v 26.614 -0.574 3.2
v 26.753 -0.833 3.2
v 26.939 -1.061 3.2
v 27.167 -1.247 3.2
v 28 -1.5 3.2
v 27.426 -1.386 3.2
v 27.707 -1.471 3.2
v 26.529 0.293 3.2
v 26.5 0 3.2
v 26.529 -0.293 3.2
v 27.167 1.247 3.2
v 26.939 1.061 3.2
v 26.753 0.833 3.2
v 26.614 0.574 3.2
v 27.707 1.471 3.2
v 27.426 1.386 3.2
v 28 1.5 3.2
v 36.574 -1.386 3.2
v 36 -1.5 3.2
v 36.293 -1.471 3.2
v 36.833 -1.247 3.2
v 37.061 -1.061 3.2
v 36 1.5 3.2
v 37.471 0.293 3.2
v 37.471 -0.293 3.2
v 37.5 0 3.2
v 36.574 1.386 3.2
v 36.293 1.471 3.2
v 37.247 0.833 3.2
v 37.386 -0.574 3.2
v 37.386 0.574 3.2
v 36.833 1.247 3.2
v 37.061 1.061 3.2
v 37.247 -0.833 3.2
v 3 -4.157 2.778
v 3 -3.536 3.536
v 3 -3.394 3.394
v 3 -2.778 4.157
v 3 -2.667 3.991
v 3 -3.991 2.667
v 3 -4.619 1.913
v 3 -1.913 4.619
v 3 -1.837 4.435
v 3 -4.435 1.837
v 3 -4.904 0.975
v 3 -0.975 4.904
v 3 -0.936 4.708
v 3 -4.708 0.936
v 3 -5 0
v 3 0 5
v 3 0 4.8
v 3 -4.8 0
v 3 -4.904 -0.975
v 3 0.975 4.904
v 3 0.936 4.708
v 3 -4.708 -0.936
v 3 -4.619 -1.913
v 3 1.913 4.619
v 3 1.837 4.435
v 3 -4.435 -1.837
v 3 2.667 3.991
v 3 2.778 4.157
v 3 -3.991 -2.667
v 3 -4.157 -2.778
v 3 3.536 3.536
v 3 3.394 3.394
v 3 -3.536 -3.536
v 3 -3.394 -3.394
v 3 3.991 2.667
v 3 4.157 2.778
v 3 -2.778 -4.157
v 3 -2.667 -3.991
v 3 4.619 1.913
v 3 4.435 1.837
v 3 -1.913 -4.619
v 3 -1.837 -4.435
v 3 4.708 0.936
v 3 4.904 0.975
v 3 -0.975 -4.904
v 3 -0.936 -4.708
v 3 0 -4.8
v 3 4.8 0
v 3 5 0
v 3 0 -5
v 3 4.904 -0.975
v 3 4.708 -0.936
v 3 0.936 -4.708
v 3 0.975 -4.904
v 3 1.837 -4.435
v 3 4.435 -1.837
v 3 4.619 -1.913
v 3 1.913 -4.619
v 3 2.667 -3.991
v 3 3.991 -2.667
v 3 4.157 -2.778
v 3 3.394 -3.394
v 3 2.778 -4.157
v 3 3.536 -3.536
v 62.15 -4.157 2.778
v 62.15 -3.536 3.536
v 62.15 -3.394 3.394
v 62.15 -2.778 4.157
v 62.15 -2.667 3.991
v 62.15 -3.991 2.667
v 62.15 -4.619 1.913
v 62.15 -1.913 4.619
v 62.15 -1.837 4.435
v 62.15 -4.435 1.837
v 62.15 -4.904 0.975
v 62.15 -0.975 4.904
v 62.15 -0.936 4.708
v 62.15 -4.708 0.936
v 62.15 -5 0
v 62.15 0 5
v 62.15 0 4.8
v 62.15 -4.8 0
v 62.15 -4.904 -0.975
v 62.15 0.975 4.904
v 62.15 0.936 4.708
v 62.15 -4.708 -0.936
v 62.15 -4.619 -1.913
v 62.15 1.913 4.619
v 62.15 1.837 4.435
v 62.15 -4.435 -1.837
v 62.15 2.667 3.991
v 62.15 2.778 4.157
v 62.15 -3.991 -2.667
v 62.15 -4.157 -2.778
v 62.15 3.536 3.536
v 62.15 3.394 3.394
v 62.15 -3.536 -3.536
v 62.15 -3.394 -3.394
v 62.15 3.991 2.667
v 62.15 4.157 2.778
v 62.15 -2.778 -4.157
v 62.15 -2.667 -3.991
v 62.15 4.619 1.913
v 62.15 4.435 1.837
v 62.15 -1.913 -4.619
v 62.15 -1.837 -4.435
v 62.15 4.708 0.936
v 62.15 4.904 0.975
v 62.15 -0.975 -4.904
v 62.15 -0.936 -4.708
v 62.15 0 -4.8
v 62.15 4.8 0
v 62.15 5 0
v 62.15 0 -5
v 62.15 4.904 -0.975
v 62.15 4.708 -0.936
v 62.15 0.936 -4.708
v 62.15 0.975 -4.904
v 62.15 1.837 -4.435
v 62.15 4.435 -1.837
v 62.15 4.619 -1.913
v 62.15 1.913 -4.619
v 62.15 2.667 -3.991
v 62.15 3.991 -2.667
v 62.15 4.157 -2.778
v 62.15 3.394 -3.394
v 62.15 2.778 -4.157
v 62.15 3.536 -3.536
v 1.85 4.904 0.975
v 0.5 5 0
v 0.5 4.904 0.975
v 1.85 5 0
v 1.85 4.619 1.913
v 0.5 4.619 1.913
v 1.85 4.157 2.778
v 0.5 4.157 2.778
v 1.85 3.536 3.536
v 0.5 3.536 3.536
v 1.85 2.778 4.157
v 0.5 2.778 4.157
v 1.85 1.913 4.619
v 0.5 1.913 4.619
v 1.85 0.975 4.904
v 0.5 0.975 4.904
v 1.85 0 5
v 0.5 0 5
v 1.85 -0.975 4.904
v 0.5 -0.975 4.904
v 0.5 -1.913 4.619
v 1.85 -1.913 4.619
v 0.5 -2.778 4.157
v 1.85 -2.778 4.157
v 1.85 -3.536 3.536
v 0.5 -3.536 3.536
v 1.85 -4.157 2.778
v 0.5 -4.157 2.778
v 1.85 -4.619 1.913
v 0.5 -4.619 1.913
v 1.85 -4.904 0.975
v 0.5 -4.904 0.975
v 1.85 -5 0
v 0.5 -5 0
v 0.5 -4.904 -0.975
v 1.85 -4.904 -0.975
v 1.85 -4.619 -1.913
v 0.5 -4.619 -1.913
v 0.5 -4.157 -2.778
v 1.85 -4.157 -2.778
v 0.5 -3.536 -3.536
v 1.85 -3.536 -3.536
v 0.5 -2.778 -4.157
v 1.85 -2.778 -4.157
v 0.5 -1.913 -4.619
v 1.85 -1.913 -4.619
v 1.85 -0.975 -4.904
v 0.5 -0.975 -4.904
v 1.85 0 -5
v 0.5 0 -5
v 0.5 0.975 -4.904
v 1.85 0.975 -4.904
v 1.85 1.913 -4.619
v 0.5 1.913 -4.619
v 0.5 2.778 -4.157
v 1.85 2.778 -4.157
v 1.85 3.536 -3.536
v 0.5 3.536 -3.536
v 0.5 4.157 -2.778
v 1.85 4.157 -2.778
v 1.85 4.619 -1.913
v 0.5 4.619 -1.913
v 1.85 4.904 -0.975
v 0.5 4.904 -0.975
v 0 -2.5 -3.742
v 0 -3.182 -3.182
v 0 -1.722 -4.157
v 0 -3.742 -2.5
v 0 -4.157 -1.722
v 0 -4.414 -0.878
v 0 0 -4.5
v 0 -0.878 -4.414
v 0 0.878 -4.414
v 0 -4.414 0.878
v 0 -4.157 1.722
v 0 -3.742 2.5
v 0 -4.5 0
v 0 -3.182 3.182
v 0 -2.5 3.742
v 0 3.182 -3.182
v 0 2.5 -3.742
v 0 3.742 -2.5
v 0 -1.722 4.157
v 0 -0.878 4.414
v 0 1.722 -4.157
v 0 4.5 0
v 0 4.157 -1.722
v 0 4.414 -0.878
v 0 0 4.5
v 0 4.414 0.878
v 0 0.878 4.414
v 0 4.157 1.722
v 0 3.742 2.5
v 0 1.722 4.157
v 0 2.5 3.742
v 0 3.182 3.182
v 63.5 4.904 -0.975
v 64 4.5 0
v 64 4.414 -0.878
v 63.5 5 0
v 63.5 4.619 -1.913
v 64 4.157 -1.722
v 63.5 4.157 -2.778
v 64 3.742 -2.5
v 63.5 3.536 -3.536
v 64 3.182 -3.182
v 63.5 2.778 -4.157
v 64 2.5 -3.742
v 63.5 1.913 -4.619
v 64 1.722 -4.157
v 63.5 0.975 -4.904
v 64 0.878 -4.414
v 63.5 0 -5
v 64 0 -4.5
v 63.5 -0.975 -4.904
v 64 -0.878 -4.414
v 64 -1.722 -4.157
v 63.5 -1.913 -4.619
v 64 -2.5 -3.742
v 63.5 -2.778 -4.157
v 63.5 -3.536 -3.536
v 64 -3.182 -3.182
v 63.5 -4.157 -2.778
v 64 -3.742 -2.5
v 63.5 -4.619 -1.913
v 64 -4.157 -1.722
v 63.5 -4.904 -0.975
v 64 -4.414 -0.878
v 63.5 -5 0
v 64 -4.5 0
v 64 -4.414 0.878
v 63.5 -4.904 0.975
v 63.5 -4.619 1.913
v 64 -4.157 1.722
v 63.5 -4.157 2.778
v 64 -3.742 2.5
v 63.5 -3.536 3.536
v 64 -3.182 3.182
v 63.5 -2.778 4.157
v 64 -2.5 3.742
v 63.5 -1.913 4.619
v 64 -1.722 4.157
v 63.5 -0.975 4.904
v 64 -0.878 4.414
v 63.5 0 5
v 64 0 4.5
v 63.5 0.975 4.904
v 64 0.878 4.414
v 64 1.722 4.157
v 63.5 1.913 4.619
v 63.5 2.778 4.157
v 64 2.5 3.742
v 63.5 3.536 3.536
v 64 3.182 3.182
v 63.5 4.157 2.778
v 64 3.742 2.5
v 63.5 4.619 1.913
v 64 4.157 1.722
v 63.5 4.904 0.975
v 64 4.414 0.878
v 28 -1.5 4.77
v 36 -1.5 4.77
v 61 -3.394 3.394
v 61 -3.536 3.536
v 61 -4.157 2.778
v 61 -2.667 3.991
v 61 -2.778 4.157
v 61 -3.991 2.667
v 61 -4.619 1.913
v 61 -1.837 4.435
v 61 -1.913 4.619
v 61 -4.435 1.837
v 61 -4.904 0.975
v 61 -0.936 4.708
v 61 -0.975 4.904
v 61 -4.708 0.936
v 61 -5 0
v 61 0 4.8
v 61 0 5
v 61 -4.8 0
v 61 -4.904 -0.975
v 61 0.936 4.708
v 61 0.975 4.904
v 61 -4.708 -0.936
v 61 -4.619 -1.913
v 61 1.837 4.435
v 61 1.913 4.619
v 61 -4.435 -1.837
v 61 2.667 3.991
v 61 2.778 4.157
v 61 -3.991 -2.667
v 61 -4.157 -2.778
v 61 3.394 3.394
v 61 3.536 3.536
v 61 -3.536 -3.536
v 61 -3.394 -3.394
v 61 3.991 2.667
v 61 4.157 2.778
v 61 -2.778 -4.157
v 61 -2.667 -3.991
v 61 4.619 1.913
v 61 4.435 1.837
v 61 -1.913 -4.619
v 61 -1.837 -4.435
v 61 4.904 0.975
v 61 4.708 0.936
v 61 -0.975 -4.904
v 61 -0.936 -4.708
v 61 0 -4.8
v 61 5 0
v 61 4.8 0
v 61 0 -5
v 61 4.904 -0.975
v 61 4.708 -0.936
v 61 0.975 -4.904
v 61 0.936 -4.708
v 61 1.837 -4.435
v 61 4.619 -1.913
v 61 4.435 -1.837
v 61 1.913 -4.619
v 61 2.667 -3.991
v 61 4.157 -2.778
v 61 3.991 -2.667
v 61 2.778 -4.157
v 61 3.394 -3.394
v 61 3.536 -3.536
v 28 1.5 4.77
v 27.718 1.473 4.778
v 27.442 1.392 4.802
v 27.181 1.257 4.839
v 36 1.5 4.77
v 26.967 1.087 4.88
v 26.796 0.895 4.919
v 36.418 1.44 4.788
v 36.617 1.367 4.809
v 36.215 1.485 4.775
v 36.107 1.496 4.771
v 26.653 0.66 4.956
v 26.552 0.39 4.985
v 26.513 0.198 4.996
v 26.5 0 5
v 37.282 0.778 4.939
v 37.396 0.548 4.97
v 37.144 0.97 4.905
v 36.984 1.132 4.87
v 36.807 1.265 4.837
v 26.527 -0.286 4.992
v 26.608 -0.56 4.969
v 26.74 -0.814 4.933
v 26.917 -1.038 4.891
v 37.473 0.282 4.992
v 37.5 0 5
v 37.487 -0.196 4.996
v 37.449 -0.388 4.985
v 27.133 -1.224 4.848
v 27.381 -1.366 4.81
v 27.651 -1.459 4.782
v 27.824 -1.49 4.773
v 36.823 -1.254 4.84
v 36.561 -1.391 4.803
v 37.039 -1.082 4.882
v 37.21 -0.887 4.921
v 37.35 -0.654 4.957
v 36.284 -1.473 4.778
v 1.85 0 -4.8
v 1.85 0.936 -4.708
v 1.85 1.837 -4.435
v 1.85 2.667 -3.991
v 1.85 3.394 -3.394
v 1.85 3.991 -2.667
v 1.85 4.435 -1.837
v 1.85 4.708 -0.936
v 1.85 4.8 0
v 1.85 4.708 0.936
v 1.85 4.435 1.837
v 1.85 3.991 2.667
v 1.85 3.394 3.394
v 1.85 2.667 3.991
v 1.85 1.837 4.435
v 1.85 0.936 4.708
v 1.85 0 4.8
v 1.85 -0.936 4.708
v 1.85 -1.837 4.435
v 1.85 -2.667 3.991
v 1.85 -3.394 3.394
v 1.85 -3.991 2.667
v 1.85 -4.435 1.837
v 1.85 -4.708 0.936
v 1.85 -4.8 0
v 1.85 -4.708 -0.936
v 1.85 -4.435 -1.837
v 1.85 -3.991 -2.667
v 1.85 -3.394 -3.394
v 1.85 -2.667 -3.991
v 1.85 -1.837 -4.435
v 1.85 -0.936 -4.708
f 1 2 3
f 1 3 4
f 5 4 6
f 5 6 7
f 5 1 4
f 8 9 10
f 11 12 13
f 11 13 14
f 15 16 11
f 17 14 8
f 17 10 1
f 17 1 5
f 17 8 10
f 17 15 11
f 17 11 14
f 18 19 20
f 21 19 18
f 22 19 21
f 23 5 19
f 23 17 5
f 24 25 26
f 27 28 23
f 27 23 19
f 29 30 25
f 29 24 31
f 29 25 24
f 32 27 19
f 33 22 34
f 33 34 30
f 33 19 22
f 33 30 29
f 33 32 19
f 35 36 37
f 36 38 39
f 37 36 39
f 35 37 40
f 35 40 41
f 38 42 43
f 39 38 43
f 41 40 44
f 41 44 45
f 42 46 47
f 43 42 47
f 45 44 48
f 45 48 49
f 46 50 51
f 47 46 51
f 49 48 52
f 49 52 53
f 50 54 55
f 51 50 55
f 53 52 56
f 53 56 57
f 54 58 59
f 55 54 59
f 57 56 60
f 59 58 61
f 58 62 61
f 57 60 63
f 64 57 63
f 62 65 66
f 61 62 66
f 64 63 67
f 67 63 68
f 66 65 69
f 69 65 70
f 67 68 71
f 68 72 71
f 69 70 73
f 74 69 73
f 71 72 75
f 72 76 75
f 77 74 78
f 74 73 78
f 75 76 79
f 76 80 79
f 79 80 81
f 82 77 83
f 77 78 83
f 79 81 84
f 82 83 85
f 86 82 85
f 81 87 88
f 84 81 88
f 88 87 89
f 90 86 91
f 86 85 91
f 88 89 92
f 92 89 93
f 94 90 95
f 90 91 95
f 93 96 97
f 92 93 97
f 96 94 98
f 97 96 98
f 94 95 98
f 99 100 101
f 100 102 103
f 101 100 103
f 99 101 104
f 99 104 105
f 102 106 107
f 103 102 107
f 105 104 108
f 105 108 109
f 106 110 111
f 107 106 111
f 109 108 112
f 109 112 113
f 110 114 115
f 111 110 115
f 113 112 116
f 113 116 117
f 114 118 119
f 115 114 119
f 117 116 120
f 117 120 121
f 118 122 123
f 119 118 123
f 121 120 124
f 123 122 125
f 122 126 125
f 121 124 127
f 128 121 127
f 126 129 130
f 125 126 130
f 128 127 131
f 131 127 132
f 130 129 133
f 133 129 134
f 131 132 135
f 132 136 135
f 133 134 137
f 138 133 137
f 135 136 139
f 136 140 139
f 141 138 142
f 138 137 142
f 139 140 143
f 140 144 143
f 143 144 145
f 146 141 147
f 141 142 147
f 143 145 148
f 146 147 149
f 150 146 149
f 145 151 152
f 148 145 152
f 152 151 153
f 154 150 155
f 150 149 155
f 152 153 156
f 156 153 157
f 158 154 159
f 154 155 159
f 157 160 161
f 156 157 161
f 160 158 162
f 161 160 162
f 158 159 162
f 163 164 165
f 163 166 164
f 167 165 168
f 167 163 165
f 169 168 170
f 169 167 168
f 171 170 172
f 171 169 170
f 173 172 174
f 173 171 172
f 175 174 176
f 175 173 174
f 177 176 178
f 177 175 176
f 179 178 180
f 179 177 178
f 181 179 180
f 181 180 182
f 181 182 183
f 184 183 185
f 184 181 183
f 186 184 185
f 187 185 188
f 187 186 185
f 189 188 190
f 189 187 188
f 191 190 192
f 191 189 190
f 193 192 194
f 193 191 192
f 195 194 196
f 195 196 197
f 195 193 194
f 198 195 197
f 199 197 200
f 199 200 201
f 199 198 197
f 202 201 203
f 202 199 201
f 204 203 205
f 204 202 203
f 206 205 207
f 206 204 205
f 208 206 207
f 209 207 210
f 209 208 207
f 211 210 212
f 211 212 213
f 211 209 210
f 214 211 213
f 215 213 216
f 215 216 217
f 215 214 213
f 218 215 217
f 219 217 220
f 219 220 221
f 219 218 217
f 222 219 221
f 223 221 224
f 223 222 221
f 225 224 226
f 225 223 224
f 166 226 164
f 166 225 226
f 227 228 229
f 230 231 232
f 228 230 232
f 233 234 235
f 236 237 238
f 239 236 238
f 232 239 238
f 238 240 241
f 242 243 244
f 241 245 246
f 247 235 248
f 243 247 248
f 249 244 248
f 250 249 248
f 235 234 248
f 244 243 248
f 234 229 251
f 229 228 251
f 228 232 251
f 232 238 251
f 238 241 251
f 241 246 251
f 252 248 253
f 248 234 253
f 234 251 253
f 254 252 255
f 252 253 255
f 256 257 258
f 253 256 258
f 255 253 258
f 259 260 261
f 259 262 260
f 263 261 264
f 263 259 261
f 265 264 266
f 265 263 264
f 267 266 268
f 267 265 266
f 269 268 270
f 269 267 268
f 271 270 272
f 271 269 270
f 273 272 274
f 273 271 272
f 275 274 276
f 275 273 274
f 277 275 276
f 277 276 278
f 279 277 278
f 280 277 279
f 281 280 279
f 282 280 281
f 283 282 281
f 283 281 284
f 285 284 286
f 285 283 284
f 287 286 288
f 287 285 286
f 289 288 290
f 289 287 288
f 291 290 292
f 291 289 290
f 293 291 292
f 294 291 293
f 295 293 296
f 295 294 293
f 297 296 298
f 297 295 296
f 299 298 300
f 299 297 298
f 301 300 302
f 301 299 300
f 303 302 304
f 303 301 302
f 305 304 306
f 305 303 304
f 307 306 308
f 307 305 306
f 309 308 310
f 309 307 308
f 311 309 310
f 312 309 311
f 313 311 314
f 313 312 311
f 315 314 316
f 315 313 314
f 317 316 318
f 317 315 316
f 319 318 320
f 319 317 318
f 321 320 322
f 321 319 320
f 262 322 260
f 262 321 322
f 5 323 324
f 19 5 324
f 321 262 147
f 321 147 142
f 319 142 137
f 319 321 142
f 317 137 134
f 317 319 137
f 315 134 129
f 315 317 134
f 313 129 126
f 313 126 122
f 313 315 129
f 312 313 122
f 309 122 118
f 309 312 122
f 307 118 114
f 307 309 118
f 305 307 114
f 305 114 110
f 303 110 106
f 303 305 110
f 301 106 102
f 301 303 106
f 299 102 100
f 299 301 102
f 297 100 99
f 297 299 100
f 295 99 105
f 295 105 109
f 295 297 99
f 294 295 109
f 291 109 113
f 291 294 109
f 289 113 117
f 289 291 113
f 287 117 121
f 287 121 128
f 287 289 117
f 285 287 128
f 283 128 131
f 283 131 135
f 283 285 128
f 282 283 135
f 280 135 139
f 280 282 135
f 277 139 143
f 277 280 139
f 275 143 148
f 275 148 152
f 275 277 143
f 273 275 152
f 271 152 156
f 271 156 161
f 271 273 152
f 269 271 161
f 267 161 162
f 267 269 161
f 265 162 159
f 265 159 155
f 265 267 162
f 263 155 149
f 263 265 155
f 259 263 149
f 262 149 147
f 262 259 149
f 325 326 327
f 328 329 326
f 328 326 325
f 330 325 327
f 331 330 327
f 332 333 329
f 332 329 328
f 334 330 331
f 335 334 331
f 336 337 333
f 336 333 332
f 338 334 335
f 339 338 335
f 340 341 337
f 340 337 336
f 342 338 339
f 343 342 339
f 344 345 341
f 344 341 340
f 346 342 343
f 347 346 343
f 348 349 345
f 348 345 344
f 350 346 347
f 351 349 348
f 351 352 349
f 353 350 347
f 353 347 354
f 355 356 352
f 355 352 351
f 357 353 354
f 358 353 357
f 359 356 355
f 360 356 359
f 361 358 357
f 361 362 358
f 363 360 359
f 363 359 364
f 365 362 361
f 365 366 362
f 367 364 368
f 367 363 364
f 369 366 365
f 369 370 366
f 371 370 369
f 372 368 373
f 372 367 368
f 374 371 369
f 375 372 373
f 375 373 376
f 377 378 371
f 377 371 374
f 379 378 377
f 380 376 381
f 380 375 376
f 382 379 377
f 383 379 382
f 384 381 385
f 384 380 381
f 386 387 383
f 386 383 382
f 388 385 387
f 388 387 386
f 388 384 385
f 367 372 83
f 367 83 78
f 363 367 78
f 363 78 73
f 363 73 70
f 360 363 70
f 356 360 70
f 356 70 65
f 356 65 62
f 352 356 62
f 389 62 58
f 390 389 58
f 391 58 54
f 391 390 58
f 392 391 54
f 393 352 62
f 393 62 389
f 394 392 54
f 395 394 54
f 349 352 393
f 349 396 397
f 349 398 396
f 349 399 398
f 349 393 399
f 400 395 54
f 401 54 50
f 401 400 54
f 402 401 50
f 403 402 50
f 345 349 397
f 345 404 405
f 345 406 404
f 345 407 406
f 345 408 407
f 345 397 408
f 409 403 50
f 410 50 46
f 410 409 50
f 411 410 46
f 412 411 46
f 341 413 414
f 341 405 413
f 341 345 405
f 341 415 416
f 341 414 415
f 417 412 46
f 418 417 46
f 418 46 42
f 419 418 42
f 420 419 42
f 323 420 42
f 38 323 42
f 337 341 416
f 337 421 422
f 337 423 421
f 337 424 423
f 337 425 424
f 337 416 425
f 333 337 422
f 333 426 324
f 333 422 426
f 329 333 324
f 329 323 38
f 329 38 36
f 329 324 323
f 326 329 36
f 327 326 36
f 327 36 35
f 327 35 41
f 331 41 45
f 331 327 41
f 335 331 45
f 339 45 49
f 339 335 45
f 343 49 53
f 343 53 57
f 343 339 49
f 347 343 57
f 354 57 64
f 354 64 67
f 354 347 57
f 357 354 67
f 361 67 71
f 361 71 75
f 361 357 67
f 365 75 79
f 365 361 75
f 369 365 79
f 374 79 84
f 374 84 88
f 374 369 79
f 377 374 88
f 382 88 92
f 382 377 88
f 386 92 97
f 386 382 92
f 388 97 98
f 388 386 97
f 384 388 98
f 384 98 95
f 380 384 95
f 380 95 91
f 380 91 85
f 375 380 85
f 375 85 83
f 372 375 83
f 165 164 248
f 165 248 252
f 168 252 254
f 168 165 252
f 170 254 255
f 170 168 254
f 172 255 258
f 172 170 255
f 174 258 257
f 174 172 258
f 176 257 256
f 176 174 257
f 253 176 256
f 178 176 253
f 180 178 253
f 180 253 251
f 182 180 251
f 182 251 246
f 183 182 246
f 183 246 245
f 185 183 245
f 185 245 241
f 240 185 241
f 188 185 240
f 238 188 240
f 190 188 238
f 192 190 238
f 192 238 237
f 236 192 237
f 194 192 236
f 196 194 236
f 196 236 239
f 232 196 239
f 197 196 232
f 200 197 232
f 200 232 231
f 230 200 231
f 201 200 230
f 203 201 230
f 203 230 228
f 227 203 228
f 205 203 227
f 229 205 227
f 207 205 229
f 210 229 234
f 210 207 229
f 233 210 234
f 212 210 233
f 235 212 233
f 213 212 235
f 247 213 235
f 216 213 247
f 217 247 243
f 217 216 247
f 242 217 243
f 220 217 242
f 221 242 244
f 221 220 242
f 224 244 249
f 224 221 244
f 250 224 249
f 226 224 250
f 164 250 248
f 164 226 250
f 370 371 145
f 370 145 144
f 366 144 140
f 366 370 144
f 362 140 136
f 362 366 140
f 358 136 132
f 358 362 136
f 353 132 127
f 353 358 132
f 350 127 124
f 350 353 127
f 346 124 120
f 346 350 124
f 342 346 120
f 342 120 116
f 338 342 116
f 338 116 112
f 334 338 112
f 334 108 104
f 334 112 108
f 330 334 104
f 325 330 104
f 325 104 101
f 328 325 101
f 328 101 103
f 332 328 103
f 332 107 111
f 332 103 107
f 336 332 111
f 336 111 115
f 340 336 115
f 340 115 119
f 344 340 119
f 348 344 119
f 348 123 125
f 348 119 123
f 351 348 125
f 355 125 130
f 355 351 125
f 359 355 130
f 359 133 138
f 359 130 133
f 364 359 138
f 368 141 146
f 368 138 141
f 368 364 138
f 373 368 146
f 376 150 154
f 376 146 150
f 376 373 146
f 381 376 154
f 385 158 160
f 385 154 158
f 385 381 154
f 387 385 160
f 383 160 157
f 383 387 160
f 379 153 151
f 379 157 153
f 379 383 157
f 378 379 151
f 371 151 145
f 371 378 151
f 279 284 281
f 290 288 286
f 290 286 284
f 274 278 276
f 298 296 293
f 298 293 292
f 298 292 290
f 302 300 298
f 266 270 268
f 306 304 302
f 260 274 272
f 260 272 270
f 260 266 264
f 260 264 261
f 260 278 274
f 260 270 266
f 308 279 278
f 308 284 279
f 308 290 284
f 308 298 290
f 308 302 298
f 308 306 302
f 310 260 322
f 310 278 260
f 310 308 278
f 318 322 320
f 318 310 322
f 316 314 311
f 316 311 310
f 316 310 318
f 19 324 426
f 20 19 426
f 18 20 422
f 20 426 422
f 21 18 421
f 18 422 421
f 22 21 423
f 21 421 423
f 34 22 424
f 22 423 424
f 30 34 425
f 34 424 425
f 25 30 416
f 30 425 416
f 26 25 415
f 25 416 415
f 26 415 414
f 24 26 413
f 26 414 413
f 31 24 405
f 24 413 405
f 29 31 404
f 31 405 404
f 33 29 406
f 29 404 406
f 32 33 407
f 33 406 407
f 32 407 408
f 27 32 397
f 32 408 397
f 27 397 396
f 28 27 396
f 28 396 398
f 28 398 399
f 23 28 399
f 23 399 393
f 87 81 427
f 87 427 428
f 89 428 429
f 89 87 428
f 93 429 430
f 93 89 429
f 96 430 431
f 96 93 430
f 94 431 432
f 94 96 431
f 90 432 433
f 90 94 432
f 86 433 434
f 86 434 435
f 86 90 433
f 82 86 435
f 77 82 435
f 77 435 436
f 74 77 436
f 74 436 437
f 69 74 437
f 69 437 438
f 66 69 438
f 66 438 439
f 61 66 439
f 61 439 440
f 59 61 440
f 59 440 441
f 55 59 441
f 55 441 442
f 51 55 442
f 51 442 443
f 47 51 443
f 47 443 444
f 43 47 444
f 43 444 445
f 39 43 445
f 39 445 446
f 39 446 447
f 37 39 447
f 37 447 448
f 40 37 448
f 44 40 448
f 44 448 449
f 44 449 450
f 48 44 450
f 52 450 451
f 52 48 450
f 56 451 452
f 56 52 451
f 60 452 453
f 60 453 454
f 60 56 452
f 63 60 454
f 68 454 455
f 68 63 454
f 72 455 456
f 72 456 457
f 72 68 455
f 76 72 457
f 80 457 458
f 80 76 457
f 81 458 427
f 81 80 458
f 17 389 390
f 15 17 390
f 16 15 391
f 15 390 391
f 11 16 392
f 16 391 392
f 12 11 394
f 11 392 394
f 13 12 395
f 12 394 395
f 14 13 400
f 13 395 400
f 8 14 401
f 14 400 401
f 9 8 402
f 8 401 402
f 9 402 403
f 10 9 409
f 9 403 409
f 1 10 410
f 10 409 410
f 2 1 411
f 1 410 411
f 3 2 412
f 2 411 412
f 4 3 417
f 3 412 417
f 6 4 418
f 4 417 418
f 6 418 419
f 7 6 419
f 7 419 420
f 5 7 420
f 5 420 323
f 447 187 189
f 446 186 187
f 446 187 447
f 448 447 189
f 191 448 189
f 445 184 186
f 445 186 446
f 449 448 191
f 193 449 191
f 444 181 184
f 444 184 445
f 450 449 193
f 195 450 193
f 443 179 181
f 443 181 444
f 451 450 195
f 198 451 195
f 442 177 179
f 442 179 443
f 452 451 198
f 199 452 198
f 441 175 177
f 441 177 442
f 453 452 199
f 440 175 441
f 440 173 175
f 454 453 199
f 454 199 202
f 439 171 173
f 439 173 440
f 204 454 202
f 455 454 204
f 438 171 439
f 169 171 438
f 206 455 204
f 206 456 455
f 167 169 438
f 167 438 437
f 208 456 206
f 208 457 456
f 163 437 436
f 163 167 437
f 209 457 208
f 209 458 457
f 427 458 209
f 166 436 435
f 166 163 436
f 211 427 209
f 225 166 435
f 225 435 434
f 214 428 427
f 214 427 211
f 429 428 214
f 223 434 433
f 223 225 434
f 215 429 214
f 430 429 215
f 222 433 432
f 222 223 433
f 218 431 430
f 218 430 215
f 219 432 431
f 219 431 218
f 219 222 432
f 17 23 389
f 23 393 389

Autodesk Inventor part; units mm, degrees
sketch "Sketch_1" plane through (0, 0, 0) normal (0, 0, 1) x (1, 0, 0)
  line L0 (64, 0) -> (0, 0)
  line L1 (0, 0) -> (0, 4.5)
  line L2 (0, 4.5) -> (0.5, 5)
  line L3 (0.5, 5) -> (63.5, 5)
  line L4 (63.5, 5) -> (64, 4.5)
  line L5 (64, 4.5) -> (64, 0)
  line L6 (64, 0) -> (0, 0)
revolve "Revolution1" add sketch "Sketch_1" angle 360 about axis through (64, 0, 0) along (1, 0, 0)
sketch "_____10" plane through (0, 0, 5) normal (0, 0, 1) x (1, 0, 0)
  arc A0 (28, 1.5) -> (28, -1.5) centre (28, 0) ccw
  line L0 (28, -1.5) -> (36, -1.5)
  arc A1 (36, -1.5) -> (36, 1.5) centre (36, 0) ccw
  line L1 (36, 1.5) -> (28, 1.5)
extrude "Extrusion1" cut sketch "_____10" against normal blind 1.8
sketch "_____5" plane through (3, 0, 0) normal (1, 0, 0) x (0, 0, -1)
  circle A0 centre (0, 0) radius 10
  circle A1 centre (0, 0) radius 4.8
extrude "Extrusion2" cut sketch "_____5" against normal blind 1.15
sketch "_____6" plane through (61, 0, 0) normal (1, 0, 0) x (0, 0, -1)
  circle A0 centre (0, 0) radius 10
  circle A1 centre (0, 0) radius 4.8
extrude "Extrusion3" cut sketch "_____6" along normal blind 1.15
ref_plane "COMBINATION_MODULE_XY" through (0, 0, 0) normal (1, 0, 0) x (0, 0, -1)
ref_plane "COMBINATION_MODULE_YZ" through (0, 0, 0) normal (0, 0, -1) x (0, 1, 0)
ref_plane "COMBINATION_MODULE_ZX" through (0, 0, 0) normal (0, 1, 0) x (1, 0, 0)
ref_plane "to_ring_b_XY" through (2.425, 0, 0) normal (1, 0, 0) x (0, 0, -1)
ref_plane "to_ring_b_YZ" through (2.425, 0, 0) normal (0, 0, -1) x (0, 1, 0)
ref_plane "to_ring_b_ZX" through (2.425, 0, 0) normal (0, 1, 0) x (1, 0, 0)
ref_plane "to_ring_s_XY" through (61.575, 0, 0) normal (1, 0, 0) x (0, 0, -1)
ref_plane "to_ring_s_YZ" through (61.575, 0, 0) normal (0, 0, -1) x (0, 1, 0)
ref_plane "to_ring_s_ZX" through (61.575, 0, 0) normal (0, 1, 0) x (1, 0, 0)
properties part number "NSFMRRA10-64-B3-S3-KC26.5-A11(000_000)_s"
